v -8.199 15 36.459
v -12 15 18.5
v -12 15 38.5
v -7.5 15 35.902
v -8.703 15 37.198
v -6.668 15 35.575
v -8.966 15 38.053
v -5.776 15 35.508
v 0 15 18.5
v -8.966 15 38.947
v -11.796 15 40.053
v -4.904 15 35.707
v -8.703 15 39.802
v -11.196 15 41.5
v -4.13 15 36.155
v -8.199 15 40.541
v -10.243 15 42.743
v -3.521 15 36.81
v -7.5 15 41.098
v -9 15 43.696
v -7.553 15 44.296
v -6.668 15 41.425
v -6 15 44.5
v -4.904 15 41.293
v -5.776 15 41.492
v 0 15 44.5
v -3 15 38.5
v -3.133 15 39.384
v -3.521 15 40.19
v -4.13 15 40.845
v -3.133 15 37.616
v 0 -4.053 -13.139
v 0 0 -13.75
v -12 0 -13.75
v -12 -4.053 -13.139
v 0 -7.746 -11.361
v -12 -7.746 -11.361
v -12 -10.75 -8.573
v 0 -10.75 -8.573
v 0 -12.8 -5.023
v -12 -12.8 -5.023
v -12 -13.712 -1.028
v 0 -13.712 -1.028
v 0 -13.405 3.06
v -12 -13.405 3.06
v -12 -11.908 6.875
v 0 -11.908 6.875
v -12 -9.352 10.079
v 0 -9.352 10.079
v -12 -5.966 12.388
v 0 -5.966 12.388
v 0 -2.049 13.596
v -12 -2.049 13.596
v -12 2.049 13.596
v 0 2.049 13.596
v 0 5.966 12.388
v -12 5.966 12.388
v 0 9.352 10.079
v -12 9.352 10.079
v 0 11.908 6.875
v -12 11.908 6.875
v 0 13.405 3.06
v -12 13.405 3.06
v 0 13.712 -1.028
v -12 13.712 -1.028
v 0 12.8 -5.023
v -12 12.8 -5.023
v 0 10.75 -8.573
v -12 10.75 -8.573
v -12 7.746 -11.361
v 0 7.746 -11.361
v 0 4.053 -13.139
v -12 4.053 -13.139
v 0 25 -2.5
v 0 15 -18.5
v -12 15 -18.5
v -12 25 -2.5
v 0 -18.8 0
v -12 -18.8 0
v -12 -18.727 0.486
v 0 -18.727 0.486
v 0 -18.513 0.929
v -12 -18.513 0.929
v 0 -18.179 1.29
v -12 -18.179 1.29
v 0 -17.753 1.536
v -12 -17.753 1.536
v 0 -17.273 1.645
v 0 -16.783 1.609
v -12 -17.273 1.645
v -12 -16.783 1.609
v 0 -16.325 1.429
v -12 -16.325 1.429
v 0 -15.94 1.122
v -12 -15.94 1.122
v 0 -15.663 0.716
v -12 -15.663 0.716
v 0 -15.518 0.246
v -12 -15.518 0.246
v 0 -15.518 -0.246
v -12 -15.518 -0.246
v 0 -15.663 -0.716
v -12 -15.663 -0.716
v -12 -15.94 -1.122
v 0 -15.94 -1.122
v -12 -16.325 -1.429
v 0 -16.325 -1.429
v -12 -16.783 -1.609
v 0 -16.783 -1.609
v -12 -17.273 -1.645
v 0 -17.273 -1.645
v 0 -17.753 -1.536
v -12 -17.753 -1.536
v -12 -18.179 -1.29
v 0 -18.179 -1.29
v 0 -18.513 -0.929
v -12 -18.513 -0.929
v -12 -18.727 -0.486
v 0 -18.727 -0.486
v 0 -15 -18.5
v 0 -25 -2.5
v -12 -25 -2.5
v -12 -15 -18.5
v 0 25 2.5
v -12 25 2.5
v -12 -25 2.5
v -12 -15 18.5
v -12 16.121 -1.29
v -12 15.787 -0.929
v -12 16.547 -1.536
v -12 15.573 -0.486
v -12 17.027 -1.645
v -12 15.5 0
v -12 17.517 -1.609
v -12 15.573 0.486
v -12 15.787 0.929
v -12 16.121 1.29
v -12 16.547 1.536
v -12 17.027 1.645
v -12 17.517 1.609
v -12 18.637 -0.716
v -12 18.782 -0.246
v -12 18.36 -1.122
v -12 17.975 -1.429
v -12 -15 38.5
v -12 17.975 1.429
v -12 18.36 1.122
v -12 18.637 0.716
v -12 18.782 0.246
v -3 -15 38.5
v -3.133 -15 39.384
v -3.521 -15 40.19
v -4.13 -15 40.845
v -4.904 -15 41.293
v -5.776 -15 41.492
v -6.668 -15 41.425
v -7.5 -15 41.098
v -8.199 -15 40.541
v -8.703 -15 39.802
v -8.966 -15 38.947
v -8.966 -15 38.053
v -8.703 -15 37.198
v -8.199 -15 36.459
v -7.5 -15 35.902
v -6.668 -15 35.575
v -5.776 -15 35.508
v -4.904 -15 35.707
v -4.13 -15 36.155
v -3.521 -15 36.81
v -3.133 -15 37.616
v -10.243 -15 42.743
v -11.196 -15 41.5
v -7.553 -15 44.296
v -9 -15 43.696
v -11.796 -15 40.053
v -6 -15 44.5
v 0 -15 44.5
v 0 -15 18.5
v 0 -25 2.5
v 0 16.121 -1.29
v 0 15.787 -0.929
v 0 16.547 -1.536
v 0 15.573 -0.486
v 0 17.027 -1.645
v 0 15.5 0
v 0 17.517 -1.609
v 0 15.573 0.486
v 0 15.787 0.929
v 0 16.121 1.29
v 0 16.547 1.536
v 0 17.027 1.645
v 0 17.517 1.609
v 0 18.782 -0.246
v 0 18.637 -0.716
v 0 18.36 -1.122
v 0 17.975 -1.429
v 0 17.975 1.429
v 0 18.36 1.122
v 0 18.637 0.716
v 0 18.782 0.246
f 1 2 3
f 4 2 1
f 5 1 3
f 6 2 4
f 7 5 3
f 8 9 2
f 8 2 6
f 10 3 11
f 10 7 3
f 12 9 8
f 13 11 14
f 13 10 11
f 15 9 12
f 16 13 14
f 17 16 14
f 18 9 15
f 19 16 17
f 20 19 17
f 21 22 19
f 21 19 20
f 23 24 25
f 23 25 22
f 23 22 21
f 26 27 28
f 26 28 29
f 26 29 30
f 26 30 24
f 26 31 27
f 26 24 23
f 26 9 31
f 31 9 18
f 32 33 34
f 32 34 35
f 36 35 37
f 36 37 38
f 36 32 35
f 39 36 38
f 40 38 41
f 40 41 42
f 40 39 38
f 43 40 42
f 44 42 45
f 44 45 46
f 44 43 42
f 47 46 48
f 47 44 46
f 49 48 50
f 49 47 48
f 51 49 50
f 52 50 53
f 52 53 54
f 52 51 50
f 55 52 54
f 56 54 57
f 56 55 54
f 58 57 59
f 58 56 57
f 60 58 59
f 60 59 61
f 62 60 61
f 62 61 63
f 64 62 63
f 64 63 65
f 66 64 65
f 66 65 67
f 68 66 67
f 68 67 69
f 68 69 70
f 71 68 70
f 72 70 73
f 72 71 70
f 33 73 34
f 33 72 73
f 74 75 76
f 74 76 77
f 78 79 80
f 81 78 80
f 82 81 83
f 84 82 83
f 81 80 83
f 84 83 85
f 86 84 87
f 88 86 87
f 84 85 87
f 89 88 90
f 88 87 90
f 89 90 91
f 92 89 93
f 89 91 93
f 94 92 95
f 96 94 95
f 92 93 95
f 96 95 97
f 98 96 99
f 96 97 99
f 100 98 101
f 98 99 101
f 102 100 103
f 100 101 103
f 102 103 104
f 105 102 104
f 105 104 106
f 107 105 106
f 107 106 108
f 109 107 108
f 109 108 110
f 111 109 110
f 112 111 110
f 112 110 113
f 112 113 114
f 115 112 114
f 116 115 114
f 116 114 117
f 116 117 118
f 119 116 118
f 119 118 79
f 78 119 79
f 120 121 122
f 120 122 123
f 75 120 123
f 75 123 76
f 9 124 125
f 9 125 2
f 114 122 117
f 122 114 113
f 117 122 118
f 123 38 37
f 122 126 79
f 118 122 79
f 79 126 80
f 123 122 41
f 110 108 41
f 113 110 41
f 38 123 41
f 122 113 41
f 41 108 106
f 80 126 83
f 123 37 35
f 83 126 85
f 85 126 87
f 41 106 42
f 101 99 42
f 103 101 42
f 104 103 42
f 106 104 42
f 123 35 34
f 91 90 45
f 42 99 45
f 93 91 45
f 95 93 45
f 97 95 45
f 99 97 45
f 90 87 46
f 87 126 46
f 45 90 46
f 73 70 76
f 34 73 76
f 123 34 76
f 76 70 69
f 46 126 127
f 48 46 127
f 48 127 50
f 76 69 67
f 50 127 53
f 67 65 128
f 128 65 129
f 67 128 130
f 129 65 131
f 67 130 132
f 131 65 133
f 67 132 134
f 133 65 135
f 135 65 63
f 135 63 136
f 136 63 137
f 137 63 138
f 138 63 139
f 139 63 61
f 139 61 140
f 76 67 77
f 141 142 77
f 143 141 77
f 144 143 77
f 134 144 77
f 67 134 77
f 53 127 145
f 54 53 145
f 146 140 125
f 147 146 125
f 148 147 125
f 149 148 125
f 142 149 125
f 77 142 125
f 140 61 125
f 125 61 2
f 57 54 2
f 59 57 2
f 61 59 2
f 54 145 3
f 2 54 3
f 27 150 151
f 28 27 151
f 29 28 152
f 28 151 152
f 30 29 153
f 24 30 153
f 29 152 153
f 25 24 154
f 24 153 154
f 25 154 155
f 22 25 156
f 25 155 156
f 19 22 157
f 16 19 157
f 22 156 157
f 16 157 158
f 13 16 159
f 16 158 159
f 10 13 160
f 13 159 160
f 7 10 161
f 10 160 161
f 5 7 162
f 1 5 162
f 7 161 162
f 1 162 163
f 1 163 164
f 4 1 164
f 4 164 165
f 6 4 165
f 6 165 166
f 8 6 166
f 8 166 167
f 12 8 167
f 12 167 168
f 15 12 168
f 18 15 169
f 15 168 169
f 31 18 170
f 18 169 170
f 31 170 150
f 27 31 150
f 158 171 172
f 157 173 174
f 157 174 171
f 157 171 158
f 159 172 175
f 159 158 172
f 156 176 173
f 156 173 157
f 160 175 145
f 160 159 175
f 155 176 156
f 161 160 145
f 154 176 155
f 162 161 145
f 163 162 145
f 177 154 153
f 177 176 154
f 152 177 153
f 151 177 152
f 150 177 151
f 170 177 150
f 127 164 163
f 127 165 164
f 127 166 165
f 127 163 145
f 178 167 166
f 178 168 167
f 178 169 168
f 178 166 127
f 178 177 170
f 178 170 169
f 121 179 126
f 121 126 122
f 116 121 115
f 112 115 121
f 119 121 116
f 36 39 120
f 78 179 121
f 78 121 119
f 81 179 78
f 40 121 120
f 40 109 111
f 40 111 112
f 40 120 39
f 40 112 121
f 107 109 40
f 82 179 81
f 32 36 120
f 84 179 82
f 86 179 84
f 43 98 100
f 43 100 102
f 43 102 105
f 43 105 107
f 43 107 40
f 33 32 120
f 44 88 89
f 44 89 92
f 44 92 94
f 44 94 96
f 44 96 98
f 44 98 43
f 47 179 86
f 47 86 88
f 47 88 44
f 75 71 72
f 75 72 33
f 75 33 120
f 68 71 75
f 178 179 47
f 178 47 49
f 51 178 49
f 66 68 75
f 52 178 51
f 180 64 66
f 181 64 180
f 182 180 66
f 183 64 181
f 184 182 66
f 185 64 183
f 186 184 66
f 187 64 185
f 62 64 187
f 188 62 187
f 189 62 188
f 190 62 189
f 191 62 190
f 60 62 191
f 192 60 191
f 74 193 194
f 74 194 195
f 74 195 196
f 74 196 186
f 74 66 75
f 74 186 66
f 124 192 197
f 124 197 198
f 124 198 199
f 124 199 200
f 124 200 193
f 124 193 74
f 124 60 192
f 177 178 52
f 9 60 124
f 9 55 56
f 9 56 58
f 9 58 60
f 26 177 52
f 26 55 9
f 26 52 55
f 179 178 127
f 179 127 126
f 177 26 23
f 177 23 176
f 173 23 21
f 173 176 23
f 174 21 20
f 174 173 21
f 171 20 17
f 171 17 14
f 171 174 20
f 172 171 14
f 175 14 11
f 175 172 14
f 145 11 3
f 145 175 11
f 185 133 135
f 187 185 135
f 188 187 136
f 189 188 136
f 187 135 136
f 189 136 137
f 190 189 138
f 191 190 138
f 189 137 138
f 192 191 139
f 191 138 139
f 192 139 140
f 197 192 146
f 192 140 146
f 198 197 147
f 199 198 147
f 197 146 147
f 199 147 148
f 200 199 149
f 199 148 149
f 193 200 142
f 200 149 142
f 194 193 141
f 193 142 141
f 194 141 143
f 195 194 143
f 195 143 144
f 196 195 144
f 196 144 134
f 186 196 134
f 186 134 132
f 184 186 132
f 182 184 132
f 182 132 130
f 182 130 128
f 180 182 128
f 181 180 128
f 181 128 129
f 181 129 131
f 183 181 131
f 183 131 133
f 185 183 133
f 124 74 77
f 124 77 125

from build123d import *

# Parameters (mm, degrees)
F1_DEPTH = 12
F3_D     = 3.3
F4_R     = 3
F5_DEPTH = 30
F6_R     = 6


with BuildPart() as f1:
    # F0 (on Right) → F1 (new body)
    with BuildSketch(Plane.YZ):
        Polygon((15, 44.5), (0, 44.5), (-15, 44.5), (-15, 18.5), (-25, 2.5), (-25, -2.5), (-15, -18.5), (0, -18.5), (15, -18.5), (25, -2.5), (25, 2.5), (15, 18.5), align=None)
        with BuildLine():
            ThreePointArc((0, 13.75), (13.75, 0), (0, -13.75))
            ThreePointArc((0, -13.75), (-13.75, 0), (0, 13.75))
        make_face(mode=Mode.SUBTRACT)
    extrude(amount=-F1_DEPTH)

    # F3 (through all)
    with Locations(Plane.YZ):
        with Locations((-17.15, 0), (17.15, 0)):
            Hole(F3_D / 2)

    # F4 (on face) → F5 (cut, through all)
    with BuildSketch(Plane.XZ.offset(15)):
        with Locations((-6, 38.5)):
            Circle(F4_R)
    extrude(amount=-F5_DEPTH, mode=Mode.SUBTRACT)

    # F6
    f6_edges = [f1.edges().sort_by_distance(p)[0] for p in [
        (-12, 0, 44.5),
    ]]
    fillet(f6_edges, radius=F6_R)


solid = f1.part
